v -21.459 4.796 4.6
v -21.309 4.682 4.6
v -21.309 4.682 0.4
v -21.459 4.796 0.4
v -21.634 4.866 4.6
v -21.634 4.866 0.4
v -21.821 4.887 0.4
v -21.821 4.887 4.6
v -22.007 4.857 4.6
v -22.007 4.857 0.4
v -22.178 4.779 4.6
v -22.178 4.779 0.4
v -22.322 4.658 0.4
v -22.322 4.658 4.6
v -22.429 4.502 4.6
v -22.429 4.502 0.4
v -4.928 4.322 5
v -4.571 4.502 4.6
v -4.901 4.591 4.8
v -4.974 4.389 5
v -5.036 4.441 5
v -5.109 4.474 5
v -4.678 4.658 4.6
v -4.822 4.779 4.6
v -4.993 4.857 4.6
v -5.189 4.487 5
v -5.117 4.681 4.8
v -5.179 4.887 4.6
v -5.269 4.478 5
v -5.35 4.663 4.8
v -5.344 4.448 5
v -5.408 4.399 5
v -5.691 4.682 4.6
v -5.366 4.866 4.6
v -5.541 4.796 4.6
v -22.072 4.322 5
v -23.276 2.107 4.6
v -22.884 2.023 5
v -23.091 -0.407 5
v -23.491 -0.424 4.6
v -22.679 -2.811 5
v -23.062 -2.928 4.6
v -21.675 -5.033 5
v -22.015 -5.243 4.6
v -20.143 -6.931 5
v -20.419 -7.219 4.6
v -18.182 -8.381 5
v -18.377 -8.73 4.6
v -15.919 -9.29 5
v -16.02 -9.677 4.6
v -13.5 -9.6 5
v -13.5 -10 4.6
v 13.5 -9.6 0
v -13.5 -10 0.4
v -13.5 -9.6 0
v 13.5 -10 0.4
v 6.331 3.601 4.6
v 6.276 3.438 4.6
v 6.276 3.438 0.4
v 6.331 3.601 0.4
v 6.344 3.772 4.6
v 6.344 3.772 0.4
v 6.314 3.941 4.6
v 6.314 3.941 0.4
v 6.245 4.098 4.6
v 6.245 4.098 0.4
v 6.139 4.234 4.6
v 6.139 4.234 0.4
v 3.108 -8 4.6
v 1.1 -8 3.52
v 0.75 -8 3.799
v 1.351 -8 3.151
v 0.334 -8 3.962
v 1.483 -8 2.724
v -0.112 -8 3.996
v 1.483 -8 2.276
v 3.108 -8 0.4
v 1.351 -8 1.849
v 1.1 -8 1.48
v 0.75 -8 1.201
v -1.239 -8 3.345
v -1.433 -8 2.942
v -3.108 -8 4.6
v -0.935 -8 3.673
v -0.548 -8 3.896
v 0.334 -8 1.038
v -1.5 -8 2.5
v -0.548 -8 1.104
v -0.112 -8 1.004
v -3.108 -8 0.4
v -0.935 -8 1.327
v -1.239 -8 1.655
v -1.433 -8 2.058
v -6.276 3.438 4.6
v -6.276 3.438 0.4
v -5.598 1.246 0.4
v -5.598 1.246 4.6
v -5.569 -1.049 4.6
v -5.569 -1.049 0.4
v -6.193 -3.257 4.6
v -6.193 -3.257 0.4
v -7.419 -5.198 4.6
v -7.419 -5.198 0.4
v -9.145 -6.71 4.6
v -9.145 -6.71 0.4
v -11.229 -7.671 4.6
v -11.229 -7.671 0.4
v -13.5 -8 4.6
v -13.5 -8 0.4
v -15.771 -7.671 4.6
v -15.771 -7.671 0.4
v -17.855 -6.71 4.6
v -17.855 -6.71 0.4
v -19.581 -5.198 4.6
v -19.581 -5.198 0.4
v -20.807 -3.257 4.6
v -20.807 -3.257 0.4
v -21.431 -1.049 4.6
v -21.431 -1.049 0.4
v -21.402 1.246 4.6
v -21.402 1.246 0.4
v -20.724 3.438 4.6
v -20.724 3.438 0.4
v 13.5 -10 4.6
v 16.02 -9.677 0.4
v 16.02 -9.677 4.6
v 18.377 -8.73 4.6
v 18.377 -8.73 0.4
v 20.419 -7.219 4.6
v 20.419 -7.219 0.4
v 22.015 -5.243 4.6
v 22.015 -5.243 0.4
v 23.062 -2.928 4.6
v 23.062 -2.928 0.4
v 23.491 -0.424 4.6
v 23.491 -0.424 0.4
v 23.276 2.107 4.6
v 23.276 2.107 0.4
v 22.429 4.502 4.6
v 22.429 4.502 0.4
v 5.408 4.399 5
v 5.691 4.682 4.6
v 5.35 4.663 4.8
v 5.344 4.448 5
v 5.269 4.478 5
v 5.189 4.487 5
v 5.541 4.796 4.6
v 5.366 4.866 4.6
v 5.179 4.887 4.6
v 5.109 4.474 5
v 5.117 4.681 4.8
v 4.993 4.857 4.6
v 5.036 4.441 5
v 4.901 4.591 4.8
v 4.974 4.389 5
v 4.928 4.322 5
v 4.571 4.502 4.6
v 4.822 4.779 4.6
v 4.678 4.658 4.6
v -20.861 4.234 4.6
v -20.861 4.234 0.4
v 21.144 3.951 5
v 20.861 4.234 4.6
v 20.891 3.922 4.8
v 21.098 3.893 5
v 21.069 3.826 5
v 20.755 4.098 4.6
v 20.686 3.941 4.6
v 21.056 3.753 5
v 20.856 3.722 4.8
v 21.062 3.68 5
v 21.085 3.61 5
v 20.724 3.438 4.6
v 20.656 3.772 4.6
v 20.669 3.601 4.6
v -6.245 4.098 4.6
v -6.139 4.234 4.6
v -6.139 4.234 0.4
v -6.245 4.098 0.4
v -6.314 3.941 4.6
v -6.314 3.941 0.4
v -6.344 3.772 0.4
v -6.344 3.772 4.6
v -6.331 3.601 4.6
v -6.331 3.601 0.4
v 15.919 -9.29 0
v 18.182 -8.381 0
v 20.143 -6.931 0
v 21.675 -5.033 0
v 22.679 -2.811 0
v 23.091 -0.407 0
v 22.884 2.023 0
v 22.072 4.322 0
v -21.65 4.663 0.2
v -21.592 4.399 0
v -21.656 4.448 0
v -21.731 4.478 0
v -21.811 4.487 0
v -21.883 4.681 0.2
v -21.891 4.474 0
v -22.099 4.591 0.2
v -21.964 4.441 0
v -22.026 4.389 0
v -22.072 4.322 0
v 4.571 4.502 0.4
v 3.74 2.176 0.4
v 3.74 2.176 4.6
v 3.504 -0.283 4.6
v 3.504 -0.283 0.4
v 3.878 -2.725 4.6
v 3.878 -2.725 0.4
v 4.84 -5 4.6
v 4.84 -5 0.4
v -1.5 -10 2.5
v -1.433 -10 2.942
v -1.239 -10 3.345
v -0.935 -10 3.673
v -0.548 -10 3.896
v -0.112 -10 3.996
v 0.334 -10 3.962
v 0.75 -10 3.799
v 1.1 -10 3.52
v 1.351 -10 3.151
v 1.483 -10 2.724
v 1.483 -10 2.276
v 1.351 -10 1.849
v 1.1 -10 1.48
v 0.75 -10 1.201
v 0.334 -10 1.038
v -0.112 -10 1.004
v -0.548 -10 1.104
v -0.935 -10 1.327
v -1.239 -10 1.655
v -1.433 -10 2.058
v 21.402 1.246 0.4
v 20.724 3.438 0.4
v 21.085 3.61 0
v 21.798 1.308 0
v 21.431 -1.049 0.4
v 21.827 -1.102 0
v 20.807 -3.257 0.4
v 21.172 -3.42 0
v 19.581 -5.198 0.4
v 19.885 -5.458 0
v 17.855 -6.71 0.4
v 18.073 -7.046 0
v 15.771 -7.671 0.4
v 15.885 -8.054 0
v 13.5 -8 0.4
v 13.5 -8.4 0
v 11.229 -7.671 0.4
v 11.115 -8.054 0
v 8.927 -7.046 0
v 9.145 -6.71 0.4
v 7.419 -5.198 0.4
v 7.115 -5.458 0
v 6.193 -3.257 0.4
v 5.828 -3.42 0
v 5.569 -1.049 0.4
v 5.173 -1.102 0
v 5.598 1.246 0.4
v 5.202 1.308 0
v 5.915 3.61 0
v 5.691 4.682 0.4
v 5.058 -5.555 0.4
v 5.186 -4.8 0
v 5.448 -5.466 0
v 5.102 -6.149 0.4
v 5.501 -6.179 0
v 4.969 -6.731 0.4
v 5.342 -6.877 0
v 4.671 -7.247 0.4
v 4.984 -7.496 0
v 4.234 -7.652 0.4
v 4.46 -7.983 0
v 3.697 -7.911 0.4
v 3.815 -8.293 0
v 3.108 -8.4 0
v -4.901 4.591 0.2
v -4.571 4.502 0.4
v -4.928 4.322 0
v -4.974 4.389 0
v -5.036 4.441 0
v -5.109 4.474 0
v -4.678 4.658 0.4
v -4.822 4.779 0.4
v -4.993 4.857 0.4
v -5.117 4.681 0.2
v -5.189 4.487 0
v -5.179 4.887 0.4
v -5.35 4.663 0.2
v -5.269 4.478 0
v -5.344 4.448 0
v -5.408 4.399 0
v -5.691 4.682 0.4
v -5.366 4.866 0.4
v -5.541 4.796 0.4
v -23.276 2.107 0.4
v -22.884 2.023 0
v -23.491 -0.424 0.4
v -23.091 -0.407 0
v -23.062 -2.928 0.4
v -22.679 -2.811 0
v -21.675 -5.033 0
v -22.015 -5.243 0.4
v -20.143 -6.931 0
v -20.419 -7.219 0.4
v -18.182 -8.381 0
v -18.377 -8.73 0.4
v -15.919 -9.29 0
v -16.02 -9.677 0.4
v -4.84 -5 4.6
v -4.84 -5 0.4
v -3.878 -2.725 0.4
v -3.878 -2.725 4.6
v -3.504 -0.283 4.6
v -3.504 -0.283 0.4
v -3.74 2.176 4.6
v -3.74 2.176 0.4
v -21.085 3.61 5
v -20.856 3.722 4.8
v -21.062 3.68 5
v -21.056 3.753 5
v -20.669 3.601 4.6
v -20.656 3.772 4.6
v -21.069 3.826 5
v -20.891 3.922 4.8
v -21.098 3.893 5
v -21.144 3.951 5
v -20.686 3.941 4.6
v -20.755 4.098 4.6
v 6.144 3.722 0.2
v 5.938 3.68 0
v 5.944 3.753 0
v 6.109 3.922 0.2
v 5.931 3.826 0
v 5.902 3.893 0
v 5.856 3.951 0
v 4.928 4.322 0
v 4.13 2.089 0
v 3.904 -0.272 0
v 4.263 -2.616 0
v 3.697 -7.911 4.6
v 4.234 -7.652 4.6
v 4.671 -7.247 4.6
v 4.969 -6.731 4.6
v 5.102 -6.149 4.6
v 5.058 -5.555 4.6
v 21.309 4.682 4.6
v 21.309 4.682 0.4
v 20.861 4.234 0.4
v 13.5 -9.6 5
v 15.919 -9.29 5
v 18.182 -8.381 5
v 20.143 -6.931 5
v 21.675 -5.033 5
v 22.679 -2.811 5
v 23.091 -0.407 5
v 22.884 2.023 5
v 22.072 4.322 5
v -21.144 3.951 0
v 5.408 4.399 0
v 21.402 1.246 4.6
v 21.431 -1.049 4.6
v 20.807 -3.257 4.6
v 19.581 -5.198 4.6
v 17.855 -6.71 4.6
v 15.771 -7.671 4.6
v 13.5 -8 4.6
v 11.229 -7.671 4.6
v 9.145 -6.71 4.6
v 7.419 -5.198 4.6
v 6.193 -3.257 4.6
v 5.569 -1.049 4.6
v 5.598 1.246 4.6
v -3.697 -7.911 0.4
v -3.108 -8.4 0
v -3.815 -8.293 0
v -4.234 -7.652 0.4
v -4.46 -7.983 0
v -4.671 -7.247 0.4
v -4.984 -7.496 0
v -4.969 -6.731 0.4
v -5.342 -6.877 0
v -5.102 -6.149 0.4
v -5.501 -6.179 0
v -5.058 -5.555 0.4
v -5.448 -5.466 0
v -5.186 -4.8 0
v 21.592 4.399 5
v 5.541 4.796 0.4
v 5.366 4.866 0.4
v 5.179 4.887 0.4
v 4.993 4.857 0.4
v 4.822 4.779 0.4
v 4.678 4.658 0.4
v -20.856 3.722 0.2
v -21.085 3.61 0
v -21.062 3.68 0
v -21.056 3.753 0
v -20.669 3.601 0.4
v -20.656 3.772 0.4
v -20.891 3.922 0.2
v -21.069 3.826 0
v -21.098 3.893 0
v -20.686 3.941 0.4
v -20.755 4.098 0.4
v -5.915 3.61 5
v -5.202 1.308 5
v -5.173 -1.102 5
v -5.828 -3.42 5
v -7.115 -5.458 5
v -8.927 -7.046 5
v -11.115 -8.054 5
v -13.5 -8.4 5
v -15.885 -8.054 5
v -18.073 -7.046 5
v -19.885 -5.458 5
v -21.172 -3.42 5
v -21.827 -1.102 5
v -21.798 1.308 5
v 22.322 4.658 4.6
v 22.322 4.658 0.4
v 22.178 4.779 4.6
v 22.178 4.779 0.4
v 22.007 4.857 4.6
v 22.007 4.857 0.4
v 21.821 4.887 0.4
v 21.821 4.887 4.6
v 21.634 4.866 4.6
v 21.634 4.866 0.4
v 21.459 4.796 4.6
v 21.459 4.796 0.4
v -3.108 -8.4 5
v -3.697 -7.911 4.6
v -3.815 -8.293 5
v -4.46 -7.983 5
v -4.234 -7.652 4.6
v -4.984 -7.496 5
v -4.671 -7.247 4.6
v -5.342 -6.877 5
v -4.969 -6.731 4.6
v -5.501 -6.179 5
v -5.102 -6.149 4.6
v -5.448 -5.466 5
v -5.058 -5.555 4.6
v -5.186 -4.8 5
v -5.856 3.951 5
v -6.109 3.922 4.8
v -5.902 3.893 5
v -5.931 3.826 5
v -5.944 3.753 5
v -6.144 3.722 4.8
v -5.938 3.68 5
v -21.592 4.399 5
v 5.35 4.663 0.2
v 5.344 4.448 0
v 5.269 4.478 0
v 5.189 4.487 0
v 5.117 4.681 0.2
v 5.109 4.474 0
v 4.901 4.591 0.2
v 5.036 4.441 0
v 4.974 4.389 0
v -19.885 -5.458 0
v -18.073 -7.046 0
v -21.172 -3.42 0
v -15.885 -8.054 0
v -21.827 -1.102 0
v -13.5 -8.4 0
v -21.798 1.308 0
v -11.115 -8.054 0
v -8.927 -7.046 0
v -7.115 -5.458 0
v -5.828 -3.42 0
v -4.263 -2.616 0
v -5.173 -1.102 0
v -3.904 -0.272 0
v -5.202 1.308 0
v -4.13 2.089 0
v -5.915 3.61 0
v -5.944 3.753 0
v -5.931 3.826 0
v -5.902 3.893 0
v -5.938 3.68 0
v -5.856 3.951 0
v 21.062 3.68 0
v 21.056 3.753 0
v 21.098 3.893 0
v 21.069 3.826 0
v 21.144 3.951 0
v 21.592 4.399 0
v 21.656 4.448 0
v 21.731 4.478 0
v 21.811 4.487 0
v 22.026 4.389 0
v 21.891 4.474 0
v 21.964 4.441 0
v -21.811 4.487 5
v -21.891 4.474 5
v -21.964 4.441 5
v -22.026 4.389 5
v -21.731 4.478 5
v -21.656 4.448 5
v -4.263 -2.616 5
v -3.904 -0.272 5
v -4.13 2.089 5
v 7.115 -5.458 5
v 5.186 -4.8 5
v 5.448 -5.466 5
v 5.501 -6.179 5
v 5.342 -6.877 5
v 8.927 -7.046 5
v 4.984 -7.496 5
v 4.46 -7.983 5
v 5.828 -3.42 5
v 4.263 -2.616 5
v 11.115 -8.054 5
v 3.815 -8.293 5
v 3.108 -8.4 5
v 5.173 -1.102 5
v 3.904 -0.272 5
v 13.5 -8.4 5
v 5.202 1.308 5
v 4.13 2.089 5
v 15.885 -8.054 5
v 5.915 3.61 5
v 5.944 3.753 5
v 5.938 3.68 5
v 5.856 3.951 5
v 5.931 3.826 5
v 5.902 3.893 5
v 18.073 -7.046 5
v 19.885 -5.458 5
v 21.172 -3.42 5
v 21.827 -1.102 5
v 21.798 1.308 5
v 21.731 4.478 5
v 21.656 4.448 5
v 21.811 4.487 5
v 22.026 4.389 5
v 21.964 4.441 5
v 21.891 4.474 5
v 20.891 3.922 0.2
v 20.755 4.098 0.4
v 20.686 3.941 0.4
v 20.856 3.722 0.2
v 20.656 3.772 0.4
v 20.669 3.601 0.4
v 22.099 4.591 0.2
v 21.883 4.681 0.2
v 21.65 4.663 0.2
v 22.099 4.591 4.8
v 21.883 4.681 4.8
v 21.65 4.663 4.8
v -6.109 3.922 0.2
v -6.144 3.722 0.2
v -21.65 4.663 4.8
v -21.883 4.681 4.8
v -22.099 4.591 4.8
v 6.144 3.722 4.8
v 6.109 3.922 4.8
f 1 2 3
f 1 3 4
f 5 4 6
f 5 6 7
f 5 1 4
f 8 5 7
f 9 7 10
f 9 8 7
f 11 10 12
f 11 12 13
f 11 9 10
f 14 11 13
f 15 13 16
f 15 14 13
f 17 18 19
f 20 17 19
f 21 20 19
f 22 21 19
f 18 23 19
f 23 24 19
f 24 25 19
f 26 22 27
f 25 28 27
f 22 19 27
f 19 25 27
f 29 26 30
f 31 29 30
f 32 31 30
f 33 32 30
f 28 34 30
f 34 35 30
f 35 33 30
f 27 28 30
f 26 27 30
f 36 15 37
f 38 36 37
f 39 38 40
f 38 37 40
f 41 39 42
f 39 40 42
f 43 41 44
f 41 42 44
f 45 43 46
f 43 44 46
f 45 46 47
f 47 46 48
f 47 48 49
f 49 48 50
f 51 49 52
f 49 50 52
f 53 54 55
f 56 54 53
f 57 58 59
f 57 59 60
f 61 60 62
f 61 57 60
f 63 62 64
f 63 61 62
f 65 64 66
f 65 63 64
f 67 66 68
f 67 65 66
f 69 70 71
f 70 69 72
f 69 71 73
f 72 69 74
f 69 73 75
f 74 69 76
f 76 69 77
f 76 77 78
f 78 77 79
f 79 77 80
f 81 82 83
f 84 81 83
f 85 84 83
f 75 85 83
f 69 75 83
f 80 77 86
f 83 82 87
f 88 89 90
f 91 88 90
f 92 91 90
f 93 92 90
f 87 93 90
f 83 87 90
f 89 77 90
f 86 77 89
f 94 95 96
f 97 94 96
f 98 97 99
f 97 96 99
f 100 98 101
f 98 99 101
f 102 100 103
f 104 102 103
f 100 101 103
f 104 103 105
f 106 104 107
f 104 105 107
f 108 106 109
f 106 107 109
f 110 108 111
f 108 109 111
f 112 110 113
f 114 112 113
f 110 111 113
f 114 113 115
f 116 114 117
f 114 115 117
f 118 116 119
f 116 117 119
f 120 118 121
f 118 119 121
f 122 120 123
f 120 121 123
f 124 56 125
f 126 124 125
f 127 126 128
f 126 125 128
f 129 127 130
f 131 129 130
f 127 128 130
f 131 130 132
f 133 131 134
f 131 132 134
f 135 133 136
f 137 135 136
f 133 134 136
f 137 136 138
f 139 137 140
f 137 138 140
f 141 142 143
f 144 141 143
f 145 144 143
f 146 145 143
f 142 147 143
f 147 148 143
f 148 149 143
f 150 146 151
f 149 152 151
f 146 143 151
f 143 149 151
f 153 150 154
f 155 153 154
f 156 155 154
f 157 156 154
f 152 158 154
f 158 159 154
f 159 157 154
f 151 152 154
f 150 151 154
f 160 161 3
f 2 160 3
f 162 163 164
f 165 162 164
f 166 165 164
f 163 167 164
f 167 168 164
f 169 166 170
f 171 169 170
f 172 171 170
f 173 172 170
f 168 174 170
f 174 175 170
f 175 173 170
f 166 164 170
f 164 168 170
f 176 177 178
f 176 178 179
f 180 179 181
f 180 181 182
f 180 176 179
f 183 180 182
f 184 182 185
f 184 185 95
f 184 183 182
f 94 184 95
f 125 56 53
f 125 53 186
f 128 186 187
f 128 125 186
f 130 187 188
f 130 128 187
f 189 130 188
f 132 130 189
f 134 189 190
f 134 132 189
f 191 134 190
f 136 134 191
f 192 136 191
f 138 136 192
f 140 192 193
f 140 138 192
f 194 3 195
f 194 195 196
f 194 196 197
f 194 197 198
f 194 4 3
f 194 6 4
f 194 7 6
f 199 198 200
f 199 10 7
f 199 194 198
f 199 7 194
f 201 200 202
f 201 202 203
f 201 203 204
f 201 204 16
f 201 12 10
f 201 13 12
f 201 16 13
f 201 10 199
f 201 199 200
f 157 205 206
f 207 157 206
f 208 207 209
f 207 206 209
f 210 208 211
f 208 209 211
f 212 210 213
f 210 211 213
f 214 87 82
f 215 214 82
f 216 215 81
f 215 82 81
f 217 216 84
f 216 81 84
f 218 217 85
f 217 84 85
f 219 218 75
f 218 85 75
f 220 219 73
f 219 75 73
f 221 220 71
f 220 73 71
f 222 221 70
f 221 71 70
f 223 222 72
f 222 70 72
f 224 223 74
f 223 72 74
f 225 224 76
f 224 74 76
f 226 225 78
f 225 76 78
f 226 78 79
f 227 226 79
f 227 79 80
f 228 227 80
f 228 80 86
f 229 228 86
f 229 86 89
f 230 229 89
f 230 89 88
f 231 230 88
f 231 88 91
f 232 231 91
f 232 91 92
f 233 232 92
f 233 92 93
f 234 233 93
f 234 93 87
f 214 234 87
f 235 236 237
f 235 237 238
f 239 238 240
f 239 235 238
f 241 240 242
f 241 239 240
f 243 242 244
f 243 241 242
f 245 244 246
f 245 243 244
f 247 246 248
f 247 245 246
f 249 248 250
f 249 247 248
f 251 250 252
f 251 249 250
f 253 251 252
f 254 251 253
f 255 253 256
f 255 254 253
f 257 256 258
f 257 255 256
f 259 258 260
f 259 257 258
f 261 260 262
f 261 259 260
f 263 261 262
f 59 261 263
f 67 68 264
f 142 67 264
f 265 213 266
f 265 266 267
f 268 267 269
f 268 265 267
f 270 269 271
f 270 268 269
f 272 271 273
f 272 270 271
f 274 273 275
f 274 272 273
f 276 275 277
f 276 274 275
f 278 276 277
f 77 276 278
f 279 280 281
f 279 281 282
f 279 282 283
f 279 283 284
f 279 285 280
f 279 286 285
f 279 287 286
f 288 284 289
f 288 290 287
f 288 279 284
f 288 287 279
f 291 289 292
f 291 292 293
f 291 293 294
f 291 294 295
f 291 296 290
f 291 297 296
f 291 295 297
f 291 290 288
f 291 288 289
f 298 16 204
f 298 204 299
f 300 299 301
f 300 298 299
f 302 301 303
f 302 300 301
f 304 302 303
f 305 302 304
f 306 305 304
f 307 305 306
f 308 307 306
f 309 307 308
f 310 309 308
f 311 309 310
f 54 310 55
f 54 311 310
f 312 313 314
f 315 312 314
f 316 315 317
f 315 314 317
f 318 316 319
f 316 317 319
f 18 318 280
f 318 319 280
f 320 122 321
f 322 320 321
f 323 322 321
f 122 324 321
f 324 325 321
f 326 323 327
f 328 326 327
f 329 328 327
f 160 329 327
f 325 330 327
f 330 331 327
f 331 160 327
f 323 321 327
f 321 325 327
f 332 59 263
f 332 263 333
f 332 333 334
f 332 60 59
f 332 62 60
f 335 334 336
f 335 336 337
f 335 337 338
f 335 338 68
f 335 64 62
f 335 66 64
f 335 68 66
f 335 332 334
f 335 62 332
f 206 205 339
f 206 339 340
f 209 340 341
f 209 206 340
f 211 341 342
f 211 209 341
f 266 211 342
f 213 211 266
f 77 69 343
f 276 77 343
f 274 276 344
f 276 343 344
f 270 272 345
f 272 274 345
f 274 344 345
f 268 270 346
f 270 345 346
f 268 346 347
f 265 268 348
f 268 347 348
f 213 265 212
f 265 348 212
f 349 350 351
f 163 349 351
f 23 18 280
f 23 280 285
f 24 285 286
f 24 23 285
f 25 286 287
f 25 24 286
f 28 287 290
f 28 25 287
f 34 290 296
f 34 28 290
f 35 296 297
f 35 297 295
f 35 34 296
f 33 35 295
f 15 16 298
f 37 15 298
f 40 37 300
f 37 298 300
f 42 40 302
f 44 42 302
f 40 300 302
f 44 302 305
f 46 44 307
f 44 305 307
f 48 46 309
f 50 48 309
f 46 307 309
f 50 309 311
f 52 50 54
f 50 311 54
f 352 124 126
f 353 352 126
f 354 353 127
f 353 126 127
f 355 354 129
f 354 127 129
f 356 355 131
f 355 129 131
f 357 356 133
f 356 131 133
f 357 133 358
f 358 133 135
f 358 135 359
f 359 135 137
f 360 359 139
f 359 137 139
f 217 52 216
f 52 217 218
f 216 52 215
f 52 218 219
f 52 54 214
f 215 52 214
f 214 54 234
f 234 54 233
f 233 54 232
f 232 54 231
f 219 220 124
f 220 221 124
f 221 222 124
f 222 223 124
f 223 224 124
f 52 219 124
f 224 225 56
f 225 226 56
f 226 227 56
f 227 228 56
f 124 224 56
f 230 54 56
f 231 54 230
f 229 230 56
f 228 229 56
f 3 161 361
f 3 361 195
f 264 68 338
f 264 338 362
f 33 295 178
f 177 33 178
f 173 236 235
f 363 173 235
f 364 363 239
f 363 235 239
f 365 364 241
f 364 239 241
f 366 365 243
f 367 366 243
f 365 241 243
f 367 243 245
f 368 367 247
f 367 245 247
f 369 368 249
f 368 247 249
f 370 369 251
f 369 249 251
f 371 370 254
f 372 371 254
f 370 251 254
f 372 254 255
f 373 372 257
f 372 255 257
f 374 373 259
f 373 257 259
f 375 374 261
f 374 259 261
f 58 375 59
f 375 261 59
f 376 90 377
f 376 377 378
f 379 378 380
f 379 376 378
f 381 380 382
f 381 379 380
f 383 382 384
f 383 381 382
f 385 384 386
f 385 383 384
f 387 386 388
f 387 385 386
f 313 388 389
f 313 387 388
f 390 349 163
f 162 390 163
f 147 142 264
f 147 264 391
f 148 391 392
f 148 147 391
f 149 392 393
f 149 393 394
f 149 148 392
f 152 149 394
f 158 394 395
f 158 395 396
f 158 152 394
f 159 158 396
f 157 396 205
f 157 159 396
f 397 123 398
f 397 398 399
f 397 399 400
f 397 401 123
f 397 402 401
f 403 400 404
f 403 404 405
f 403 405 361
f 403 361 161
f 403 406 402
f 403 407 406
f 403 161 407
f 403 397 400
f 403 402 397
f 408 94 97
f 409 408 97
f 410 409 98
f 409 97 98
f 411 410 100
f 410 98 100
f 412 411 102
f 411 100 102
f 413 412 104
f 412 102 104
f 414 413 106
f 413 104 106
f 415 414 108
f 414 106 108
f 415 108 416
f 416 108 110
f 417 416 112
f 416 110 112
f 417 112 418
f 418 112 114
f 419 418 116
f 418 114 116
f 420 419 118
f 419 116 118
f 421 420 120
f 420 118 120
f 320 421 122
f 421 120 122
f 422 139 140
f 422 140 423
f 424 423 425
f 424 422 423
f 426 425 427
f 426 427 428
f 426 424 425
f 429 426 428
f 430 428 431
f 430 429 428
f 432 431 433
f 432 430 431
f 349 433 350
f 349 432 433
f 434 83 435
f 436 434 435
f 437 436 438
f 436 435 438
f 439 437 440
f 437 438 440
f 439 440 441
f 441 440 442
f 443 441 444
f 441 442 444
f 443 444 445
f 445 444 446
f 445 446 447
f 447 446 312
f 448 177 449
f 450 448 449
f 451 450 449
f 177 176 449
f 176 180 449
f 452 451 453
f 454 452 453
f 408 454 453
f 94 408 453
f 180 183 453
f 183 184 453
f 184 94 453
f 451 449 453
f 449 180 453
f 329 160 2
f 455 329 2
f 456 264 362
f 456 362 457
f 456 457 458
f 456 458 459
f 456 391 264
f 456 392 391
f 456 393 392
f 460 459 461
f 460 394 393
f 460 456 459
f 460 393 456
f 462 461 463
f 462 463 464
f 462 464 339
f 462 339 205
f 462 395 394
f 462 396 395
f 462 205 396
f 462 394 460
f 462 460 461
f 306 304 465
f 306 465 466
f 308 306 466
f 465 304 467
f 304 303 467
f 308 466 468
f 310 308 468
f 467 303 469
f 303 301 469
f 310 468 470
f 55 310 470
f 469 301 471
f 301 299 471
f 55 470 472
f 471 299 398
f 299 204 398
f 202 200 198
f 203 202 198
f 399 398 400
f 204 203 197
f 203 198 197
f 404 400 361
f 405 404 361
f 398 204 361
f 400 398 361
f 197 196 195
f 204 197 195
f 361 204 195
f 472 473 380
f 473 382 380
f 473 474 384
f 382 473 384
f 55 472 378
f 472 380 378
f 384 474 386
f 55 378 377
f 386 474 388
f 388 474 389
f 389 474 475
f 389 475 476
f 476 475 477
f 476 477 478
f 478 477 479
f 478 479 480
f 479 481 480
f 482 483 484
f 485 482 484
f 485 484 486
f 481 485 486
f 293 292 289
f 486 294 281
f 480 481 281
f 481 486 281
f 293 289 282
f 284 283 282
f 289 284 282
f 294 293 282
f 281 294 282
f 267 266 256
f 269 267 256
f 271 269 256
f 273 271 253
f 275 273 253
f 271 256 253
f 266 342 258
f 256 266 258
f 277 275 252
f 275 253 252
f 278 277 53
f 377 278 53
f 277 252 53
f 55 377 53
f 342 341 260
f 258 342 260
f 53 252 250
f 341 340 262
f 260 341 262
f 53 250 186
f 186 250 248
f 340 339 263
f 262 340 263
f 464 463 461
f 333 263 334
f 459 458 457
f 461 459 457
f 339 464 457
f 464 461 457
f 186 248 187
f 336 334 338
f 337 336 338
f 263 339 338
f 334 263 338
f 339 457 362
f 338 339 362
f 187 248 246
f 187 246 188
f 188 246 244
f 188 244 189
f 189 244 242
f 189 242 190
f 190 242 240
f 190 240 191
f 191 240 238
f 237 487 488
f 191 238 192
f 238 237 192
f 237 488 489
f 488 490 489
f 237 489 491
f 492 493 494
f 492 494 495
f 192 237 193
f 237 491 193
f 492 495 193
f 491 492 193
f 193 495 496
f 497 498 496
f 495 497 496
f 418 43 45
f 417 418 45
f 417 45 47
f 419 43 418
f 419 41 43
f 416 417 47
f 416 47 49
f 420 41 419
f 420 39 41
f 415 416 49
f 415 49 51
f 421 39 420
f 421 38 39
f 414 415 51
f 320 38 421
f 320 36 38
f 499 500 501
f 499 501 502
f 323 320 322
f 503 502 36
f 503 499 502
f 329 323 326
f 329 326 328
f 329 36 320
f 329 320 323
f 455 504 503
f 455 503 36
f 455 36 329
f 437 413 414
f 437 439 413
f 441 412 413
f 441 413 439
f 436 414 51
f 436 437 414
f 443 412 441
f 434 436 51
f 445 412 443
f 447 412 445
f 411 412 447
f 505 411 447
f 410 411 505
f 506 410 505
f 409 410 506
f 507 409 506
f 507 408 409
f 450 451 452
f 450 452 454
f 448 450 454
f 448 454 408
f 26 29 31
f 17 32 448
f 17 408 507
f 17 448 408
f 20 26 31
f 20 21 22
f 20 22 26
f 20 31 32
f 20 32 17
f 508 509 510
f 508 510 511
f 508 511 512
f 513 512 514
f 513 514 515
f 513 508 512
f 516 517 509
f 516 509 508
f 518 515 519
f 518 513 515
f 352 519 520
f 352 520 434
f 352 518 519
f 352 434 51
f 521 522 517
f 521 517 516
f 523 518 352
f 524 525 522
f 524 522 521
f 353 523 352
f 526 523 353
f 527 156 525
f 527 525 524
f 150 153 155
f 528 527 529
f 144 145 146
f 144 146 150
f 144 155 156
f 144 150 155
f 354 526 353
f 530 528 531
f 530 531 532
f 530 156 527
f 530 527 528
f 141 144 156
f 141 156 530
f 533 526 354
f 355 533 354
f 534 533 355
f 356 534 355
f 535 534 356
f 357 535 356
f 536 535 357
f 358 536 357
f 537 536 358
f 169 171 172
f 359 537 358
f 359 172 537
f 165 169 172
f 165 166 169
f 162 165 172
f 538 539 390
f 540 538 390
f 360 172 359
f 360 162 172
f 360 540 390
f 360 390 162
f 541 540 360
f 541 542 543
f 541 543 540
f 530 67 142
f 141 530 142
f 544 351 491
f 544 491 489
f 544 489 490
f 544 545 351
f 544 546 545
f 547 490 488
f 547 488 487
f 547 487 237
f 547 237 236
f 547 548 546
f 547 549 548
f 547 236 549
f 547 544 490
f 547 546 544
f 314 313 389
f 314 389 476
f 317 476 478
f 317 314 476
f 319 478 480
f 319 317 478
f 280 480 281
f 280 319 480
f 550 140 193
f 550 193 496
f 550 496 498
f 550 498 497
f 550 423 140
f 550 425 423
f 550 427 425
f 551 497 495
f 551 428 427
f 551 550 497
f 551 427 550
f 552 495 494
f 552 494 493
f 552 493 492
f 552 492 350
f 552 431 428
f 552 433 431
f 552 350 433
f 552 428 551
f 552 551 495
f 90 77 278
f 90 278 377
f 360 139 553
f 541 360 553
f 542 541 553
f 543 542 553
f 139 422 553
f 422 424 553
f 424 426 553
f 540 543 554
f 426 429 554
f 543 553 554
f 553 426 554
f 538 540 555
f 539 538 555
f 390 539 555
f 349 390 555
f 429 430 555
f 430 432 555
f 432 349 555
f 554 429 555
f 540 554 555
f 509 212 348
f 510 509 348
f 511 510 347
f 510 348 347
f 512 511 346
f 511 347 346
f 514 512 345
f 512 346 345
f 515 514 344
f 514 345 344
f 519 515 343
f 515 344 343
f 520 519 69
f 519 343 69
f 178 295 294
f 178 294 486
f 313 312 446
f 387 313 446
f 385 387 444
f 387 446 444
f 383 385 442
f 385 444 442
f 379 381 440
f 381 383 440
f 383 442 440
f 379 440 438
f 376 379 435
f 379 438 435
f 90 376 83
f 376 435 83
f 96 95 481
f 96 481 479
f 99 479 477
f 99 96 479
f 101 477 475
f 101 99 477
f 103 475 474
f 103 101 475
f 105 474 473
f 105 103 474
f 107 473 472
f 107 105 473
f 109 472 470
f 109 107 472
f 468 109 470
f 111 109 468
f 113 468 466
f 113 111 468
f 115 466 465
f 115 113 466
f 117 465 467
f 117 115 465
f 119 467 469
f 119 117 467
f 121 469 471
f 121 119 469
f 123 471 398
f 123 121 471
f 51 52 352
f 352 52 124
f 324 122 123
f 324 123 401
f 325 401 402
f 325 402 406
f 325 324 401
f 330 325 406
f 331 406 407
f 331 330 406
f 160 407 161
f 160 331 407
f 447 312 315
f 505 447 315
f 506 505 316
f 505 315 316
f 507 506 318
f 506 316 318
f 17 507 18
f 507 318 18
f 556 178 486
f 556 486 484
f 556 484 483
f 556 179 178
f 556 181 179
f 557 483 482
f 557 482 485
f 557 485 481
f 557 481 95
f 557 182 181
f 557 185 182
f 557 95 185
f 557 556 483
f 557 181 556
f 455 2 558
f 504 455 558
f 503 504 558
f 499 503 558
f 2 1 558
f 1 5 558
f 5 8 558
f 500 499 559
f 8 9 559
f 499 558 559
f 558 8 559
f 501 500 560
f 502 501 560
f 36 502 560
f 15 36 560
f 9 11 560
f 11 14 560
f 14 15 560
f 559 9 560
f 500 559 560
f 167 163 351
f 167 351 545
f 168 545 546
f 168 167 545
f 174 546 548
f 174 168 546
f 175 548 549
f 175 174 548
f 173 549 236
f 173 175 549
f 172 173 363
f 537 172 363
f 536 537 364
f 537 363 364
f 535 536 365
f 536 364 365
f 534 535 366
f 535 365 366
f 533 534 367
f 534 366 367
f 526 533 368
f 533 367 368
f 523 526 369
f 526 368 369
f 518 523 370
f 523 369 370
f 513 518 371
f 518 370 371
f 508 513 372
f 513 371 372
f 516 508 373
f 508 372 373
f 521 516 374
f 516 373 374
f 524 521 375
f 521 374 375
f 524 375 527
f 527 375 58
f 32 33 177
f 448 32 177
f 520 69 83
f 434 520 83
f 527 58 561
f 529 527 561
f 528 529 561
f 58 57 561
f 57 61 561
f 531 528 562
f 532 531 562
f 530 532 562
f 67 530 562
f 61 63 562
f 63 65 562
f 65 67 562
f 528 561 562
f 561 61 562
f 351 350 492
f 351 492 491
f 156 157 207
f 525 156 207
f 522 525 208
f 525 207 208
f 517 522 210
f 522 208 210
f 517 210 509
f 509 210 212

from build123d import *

# Parameters (mm, degrees)
F1_DEPTH = 5
F2_R     = 0.7
F3_R     = 2
F4_SIZE  = 0.4
F5_R     = 1.5
F6_DEPTH = 2.001


with BuildPart() as f1:
    # F0 (on Top) → F1 (new body)
    with BuildSketch(Plane.XY):
        with BuildLine():
            ThreePointArc((-7.5, -8), (-3.665936, -1.814164), (-5.040446, 5.332537))
            Line((-5.040446, 5.332537), (-6.5, 3.872983))
            ThreePointArc((-6.5, 3.872983), (-13.5, -8), (-20.5, 3.872983))
            Line((-20.5, 3.872983), (-21.959554, 5.332537))
            ThreePointArc((-21.959554, 5.332537), (-22.255723, -4.830871), (-13.5, -10))
            ThreePointArc((-13.5, -10), (-10.337722, -9.486833), (-7.5, -8))
        make_face()
        with BuildLine():
            Line((7.5, -8), (-7.5, -8))
            ThreePointArc((-7.5, -8), (-10.337722, -9.486833), (-13.5, -10))
            Line((-13.5, -10), (13.5, -10))
            ThreePointArc((13.5, -10), (10.337722, -9.486833), (7.5, -8))
        make_face()
        with BuildLine():
            ThreePointArc((5.040446, 5.332537), (3.665936, -1.814164), (7.5, -8))
            ThreePointArc((7.5, -8), (10.337722, -9.486833), (13.5, -10))
            ThreePointArc((13.5, -10), (22.255723, -4.830871), (21.959554, 5.332537))
            Line((21.959554, 5.332537), (20.5, 3.872983))
            ThreePointArc((20.5, 3.872983), (13.5, -8), (6.5, 3.872983))
            Line((6.5, 3.872983), (5.040446, 5.332537))
        make_face()
    extrude(amount=F1_DEPTH)

    # F2
    f2_edges = [f1.edges().sort_by_distance(p)[0] for p in [
        (5.040446, 5.332537, 2.5),
        (6.5, 3.872983, 2.5),
        (20.5, 3.872983, 2.5),
        (21.959554, 5.332537, 2.5),
        (-5.040446, 5.332537, 2.5),
        (-6.5, 3.872983, 2.5),
        (-21.959554, 5.332537, 2.5),
        (-20.5, 3.872983, 2.5),
    ]]
    fillet(f2_edges, radius=F2_R)

    # F3
    f3_edges = [f1.edges().sort_by_distance(p)[0] for p in [
        (-7.5, -8, 2.5),
        (7.5, -8, 2.5),
    ]]
    fillet(f3_edges, radius=F3_R)

    # F4
    f4_edges = [f1.edges().sort_by_distance(p)[0] for p in [
        (3.504001, -0.282849, 0),
        (4.839746, -7, 0),
        (5.084945, 4.878277, 0),
        (0, -8, 0),
        (5.915081, 4.457902, 0),
        (-4.839746, -7, 0),
        (6.334145, 3.857567, 0),
        (-3.504001, -0.282849, 0),
        (13.5, -8, 0),
        (-5.084945, 4.878277, 0),
        (20.665855, 3.857567, 0),
        (-5.915081, 4.457902, 0),
        (21.084919, 4.457902, 0),
        (-6.334145, 3.857567, 0),
        (21.915055, 4.878277, 0),
        (-13.5, -8, 0),
        (22.015365, -5.242954, 0),
        (-20.665855, 3.857567, 0),
        (0, -10, 0),
        (-21.084919, 4.457902, 0),
        (-22.015365, -5.242954, 0),
        (-21.915055, 4.878277, 0),
        (3.504001, -0.282849, 5),
        (4.839746, -7, 5),
        (5.084945, 4.878277, 5),
        (0, -8, 5),
        (5.915081, 4.457902, 5),
        (-4.839746, -7, 5),
        (6.334145, 3.857567, 5),
        (-3.504001, -0.282849, 5),
        (13.5, -8, 5),
        (-5.084945, 4.878277, 5),
        (20.665855, 3.857567, 5),
        (-5.915081, 4.457902, 5),
        (21.084919, 4.457902, 5),
        (-6.334145, 3.857567, 5),
        (21.915055, 4.878277, 5),
        (-13.5, -8, 5),
        (22.015365, -5.242954, 5),
        (-20.665855, 3.857567, 5),
        (0, -10, 5),
        (-21.084919, 4.457902, 5),
        (-22.015365, -5.242954, 5),
        (-21.915055, 4.878277, 5),
    ]]
    chamfer(f4_edges, length=F4_SIZE)

    # F5 (on face) → F6 (cut, through all)
    with BuildSketch(Plane(origin=(0, -8, 0), x_dir=(-1, 0, 0), z_dir=(0, 1, 0))):
        with Locations((0, 2.5)):
            Circle(F5_R)
    extrude(amount=-F6_DEPTH, mode=Mode.SUBTRACT)


solid = f1.part
